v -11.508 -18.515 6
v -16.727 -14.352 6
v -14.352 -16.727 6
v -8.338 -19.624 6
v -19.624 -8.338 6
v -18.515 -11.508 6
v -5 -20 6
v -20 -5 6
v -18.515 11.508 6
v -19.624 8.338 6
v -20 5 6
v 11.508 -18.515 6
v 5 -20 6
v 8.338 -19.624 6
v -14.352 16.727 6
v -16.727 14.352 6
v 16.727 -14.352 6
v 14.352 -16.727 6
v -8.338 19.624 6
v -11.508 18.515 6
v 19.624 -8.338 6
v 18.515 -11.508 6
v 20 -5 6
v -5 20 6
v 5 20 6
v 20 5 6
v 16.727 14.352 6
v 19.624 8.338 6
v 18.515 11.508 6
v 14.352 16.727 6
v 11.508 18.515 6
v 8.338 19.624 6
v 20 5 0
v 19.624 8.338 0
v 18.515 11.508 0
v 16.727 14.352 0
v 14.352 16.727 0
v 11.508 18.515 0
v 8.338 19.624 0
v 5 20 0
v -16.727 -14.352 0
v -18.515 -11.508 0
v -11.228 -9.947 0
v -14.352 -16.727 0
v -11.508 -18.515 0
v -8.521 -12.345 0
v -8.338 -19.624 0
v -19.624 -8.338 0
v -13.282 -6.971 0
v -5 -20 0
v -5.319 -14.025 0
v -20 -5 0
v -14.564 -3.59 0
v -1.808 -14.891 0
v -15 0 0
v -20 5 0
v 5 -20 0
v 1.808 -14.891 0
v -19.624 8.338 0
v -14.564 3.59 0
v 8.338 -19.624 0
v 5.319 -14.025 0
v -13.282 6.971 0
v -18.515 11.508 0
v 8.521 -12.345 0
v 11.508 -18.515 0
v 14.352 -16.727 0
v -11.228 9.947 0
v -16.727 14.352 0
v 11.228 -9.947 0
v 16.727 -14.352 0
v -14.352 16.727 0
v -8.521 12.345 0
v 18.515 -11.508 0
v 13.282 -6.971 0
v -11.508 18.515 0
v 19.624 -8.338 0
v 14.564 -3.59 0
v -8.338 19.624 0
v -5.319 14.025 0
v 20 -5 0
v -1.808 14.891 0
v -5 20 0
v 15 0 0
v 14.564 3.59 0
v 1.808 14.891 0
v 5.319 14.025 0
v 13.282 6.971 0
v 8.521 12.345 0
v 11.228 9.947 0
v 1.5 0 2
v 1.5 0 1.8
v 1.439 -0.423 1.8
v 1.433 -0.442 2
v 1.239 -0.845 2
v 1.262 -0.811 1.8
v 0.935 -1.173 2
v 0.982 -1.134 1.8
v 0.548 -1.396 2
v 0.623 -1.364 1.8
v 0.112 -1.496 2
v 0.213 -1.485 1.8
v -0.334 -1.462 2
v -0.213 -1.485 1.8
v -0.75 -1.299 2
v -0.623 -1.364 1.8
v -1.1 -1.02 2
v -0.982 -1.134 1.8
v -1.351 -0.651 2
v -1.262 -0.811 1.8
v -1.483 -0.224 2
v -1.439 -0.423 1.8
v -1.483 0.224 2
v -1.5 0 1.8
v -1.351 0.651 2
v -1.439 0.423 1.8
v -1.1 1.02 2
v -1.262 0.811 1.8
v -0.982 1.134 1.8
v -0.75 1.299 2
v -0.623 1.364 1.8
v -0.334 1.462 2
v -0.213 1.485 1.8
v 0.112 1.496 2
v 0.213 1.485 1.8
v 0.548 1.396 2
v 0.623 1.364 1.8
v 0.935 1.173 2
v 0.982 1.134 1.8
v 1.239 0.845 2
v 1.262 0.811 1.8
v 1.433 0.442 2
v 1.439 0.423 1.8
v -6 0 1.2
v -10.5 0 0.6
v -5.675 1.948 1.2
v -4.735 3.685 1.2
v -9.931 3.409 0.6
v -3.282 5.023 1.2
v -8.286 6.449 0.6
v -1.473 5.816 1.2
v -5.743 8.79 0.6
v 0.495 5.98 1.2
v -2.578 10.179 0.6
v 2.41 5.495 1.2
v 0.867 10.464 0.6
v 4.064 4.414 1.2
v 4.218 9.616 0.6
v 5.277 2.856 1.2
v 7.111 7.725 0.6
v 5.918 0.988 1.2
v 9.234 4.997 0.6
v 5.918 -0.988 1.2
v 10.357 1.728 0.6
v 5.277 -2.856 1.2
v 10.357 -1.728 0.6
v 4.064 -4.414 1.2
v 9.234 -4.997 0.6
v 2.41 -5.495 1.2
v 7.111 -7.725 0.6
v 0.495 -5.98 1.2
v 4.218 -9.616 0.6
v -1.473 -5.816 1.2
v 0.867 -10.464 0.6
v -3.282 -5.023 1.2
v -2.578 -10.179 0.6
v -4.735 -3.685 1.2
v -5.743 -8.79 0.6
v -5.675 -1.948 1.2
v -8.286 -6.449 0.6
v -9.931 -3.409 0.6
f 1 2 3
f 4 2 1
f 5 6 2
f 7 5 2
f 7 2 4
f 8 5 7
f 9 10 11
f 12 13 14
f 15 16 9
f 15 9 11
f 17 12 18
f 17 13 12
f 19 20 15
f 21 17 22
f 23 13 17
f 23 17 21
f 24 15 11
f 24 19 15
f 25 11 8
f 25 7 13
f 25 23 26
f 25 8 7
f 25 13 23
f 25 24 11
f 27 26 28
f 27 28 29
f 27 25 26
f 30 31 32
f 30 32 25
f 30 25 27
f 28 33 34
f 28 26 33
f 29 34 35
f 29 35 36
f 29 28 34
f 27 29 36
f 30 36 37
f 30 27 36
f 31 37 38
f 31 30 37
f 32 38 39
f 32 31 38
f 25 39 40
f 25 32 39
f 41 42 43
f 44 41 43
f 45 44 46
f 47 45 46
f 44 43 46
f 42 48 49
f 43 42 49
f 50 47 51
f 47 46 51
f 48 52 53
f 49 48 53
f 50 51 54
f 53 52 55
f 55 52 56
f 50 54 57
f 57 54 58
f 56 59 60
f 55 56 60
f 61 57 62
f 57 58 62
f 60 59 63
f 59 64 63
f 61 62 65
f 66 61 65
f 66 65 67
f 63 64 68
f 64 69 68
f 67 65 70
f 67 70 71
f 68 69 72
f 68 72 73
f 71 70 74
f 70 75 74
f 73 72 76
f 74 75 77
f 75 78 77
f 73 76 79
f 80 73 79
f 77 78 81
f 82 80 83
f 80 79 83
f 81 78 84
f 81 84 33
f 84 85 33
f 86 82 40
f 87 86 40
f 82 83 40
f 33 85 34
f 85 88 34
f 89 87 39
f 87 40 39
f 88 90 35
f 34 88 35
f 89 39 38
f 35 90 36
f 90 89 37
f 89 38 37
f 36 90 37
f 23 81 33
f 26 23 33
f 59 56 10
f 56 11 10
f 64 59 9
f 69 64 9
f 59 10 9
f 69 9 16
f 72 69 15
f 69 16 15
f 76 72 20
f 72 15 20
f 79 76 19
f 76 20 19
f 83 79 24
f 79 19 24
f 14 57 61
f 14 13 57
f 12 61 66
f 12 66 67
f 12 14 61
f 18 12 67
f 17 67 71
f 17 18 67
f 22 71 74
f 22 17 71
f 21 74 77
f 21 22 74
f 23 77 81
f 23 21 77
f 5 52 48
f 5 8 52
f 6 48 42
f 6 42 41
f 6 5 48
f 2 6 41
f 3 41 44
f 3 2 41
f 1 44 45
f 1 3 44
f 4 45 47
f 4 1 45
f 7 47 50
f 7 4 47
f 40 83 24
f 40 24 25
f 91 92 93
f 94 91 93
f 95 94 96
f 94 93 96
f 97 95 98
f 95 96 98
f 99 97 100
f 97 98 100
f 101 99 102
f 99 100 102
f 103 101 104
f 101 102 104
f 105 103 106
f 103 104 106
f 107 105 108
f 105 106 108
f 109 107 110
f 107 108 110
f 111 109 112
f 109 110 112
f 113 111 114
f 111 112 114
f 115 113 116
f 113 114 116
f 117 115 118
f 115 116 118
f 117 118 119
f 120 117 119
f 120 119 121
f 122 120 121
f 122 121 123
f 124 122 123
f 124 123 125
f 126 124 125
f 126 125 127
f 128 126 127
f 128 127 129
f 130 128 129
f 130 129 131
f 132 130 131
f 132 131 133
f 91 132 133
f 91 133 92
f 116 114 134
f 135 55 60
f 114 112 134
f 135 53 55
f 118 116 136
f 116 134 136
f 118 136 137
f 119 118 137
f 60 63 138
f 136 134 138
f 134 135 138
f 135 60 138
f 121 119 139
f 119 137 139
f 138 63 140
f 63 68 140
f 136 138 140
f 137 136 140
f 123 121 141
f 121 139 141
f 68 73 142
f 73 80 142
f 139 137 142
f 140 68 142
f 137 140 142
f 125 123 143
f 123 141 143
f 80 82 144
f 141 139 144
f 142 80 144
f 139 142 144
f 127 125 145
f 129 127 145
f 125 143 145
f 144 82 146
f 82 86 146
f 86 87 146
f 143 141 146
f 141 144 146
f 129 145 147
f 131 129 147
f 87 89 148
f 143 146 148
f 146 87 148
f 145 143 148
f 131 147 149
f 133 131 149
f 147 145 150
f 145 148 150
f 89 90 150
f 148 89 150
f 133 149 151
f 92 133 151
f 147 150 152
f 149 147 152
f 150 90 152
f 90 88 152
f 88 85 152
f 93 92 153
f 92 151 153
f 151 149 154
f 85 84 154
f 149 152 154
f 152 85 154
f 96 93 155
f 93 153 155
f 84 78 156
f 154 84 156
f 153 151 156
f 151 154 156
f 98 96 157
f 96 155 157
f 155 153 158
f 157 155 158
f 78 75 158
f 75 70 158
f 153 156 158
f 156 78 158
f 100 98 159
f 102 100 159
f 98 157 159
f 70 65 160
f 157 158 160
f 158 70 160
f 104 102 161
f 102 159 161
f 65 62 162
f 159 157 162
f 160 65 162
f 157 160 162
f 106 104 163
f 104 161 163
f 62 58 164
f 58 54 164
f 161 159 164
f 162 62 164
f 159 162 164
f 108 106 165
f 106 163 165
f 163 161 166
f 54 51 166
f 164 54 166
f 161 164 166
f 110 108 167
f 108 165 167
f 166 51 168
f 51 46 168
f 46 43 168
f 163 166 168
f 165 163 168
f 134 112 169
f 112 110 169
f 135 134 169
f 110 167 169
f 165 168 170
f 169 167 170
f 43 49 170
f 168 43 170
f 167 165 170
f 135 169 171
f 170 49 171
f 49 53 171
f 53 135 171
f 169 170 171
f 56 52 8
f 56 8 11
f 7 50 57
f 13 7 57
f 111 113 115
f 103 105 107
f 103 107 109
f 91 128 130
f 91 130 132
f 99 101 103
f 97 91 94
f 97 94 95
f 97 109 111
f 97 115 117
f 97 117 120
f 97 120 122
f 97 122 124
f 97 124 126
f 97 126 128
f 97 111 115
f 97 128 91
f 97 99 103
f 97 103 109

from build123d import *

# Parameters (mm, degrees)
F0_W     = 40
F0_H     = 40
F1_DEPTH = 6
F2_R     = 15
F3_R     = 1.5
F4_DEPTH = 2


with BuildPart() as f1:
    # F0 (on Top) → F1 (new body)
    with BuildSketch(Plane.XY):
        Rectangle(F0_W, F0_H)
    extrude(amount=F1_DEPTH)

    # F2
    f2_edges = [f1.edges().sort_by_distance(p)[0] for p in [
        (-20, 20, 3),
        (20, 20, 3),
        (20, -20, 3),
        (-20, -20, 3),
    ]]
    fillet(f2_edges, radius=F2_R)

    # F3 (on face) → F4 (cut)
    with BuildSketch(Plane(origin=(0, 0, 0), x_dir=(1, 0, 0), z_dir=(0, 0, -1))):
        Circle(F3_R)
    extrude(amount=-F4_DEPTH, mode=Mode.SUBTRACT)

    # F5 (on Front) → F6 (revolve, cut)
    with BuildSketch(Plane.XZ):
        Polygon((0, 0), (0, 2), (-15, 0), align=None)
    revolve(axis=Axis((0, 0, 1), (0, 0, -1)), mode=Mode.SUBTRACT)


solid = f1.part
